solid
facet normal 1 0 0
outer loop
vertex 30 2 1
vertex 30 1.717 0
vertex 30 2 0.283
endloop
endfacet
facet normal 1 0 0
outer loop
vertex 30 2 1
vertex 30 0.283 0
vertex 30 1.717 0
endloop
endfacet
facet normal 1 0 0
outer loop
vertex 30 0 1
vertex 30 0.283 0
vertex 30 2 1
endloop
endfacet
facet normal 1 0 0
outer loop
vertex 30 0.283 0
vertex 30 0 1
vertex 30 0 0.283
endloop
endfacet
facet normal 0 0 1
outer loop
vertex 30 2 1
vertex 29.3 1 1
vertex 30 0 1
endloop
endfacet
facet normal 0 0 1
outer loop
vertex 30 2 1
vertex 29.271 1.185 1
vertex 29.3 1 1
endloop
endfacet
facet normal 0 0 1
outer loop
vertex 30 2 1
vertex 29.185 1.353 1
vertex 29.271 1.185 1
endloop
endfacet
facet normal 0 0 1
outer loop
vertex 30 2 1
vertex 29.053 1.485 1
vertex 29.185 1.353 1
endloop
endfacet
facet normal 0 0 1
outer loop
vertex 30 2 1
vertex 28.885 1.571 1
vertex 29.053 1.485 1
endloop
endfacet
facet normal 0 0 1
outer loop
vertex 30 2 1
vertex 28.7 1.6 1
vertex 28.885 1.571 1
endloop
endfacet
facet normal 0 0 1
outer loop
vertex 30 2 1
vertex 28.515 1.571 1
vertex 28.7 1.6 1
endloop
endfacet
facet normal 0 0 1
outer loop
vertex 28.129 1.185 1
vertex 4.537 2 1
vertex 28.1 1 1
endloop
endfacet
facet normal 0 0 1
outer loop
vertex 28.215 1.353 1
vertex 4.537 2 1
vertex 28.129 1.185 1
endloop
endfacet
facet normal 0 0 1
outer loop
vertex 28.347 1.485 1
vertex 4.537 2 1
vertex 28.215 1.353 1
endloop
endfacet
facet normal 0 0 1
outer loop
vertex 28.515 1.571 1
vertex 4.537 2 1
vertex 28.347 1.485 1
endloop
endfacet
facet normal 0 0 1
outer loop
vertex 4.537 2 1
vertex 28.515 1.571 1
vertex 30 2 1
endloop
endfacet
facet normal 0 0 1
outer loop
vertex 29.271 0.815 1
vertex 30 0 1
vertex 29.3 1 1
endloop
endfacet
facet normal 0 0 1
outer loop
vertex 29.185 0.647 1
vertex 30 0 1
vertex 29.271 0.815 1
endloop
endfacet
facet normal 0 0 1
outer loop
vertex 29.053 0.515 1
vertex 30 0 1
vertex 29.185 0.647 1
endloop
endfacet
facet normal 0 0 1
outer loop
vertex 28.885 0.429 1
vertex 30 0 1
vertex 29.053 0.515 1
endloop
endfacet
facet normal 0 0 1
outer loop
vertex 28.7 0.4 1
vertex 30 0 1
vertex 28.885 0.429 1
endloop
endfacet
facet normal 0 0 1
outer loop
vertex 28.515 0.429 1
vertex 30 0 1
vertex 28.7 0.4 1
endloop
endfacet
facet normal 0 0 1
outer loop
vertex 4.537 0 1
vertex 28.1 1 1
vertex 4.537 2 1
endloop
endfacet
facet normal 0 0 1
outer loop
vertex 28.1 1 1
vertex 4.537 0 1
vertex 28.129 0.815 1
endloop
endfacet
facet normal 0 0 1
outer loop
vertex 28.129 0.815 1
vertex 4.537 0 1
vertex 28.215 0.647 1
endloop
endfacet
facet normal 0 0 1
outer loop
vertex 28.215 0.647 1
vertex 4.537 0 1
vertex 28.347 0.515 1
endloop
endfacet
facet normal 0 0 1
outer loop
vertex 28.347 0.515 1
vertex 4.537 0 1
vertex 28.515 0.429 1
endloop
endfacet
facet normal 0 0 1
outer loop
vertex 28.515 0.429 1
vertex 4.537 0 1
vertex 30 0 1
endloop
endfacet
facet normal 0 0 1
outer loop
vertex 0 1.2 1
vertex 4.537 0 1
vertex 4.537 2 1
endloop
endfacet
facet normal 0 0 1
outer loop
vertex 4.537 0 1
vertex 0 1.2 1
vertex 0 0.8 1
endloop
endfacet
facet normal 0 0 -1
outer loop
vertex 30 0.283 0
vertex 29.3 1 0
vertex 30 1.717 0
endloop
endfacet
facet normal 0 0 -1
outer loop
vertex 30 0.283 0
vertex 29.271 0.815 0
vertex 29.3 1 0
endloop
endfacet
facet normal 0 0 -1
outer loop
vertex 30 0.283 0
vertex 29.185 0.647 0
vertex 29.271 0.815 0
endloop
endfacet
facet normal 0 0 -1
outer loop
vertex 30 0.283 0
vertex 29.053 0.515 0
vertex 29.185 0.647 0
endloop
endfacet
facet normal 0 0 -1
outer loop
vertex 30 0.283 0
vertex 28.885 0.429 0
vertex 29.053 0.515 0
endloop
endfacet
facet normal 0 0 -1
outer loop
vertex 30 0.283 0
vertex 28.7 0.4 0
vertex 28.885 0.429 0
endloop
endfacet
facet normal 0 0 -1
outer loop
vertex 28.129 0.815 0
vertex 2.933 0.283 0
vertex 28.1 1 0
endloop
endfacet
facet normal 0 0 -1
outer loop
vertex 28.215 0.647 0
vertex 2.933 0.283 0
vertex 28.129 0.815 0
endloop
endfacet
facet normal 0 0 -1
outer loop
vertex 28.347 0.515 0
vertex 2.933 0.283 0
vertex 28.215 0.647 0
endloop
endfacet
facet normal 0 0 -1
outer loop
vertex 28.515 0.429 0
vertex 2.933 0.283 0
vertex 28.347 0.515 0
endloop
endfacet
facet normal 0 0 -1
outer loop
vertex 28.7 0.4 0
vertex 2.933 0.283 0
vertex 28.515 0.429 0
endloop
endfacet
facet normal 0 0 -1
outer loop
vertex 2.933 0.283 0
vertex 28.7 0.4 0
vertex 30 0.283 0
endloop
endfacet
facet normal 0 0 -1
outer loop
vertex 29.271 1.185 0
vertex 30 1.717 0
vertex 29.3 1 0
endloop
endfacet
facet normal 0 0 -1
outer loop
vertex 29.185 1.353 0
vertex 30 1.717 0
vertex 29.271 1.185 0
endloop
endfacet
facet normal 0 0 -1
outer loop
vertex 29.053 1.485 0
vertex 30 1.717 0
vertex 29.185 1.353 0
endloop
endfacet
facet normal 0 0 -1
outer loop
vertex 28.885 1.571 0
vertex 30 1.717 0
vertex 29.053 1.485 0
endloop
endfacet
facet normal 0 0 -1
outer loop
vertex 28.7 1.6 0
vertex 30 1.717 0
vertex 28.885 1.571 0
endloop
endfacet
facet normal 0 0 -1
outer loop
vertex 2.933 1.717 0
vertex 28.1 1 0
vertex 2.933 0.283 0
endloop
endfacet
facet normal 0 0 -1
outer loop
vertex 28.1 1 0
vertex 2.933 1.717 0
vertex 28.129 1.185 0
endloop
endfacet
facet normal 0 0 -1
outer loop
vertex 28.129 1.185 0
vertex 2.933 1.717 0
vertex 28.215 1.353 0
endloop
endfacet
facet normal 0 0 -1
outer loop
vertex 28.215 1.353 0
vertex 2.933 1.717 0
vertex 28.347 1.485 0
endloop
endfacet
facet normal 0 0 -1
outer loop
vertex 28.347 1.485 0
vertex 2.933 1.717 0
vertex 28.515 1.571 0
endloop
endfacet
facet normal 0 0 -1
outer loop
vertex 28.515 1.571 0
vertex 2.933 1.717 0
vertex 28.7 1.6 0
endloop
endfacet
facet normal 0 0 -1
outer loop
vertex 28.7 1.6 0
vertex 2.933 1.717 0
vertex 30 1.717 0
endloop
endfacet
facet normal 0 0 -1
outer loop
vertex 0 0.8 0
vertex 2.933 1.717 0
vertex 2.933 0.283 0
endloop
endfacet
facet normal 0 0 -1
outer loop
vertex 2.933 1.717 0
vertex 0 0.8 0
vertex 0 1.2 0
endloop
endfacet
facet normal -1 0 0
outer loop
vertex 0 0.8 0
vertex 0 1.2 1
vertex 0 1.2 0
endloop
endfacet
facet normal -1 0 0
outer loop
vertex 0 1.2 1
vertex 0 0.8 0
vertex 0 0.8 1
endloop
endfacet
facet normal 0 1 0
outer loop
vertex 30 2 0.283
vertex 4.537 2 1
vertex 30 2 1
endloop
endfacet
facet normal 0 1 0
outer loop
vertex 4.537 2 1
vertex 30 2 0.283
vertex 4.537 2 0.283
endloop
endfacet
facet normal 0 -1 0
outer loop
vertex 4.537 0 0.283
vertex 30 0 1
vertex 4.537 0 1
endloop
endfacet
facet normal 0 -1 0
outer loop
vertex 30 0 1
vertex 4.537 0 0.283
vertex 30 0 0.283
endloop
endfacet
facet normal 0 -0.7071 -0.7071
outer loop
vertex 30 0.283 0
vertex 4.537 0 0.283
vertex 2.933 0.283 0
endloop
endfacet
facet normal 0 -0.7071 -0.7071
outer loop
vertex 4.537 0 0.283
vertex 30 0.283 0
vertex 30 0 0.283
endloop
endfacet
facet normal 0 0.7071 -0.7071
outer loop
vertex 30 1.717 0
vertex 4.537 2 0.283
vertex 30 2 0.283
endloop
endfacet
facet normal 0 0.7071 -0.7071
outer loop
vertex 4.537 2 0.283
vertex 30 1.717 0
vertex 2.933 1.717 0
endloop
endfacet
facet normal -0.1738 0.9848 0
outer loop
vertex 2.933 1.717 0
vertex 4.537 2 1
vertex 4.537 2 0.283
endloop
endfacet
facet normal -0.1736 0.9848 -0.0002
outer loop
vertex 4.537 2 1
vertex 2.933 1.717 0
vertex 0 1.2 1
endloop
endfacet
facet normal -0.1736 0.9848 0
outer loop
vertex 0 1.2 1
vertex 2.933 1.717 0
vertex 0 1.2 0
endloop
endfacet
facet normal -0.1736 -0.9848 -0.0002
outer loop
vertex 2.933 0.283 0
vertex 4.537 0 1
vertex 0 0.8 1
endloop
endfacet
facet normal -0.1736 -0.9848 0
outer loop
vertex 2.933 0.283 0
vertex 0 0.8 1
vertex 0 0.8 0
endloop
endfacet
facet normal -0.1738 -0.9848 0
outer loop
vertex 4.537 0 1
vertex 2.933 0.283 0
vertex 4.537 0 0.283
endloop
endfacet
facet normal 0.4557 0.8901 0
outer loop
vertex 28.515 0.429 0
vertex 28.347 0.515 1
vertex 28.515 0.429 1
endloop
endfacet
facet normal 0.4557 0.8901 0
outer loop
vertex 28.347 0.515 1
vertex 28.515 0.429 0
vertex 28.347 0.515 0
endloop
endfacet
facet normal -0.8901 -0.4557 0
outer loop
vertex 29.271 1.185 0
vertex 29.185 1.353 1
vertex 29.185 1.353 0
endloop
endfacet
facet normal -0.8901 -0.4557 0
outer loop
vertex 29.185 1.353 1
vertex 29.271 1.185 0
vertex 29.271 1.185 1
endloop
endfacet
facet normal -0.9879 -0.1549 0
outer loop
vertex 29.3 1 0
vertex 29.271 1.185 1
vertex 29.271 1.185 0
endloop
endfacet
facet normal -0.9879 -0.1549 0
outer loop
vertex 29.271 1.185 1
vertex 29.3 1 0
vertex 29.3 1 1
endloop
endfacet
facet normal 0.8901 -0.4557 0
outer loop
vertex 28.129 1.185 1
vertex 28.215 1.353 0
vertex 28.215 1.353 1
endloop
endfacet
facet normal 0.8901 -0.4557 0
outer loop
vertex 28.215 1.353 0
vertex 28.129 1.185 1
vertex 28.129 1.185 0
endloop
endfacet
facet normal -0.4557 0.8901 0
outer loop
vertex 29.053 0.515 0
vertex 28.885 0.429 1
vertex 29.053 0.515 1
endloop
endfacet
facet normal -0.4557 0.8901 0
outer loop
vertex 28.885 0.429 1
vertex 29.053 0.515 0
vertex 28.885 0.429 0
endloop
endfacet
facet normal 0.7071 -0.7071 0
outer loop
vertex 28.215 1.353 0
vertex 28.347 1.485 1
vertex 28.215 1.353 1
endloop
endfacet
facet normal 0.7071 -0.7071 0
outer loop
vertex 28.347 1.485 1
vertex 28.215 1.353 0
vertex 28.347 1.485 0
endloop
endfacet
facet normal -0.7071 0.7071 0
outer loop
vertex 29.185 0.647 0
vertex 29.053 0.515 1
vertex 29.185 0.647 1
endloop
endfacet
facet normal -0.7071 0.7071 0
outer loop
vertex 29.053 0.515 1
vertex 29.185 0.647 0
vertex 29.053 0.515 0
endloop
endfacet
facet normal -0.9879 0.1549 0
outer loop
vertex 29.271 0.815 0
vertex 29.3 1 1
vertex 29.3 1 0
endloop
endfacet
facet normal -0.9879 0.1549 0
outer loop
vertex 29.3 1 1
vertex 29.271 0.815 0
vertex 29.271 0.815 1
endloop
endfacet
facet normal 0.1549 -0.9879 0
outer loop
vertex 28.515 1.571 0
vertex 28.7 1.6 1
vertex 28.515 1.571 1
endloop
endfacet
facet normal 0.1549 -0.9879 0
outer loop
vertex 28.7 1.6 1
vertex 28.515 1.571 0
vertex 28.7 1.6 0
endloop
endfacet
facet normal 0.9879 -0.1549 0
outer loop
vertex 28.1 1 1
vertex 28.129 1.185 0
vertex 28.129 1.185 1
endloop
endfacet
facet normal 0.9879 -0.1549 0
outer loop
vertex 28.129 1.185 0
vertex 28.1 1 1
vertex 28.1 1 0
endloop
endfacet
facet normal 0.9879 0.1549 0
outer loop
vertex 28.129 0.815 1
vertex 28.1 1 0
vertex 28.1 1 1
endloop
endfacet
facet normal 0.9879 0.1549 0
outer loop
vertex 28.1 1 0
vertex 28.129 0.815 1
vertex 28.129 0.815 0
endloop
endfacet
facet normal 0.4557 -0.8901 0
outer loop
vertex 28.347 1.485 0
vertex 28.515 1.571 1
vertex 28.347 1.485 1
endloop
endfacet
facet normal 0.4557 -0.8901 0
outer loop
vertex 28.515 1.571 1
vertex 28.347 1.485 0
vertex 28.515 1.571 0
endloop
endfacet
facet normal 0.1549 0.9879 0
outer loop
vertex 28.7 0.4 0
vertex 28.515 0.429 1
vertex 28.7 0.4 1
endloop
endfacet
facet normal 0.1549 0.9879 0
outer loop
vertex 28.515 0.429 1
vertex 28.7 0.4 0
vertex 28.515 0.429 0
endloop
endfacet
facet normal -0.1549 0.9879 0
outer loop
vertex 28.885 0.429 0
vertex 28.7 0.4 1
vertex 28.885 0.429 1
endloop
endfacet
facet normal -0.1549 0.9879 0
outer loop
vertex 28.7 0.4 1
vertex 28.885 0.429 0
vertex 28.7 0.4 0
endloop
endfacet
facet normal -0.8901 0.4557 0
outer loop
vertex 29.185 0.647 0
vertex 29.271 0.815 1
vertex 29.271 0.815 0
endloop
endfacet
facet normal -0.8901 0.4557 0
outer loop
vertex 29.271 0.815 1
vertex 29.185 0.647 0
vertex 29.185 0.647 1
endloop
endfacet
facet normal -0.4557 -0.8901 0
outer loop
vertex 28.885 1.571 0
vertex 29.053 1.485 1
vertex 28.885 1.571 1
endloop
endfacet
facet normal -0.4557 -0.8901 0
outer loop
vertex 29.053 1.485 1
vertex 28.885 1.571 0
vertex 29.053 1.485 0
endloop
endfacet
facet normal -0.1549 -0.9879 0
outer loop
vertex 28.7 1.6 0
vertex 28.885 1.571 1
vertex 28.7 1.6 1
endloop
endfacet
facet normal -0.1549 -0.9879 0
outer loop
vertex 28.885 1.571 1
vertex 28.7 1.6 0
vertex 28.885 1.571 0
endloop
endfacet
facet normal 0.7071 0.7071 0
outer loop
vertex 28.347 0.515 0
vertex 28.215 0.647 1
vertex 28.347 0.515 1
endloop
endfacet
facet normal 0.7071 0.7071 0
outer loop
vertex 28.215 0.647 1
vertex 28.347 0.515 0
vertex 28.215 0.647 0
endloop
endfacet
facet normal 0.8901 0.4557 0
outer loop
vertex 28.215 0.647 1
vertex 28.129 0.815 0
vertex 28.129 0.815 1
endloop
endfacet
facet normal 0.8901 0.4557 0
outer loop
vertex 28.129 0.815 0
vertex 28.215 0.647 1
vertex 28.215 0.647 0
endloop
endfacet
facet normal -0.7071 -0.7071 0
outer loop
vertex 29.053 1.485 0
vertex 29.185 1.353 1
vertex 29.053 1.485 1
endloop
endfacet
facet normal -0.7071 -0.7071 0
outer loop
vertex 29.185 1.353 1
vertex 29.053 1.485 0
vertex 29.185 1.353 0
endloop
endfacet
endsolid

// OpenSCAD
difference() {
  cube([30, 2, 1]);
  
  // Chamfered bottom.
  rotate([45, 0, 0])
    cube([100, 0.4, 0.4], center=true);
  translate([0, 2, 0])
    rotate([45, 0, 0])
      cube([100, 0.4, 0.4], center=true);
  
  // Pointy tip.
  translate([0, 1.2, -0.5])
    rotate([0, 0, 10])
      cube([20, 20, 2]);
  translate([0, 0.8, -0.5])
    rotate([0, 0, -10])
      translate([0, -20, 0])
        cube([20, 20, 2]);
  
  $fn = 20;
  
  // Hole.
  translate([28.7, 1, -1])
    cylinder(4, d=1.2);
}
